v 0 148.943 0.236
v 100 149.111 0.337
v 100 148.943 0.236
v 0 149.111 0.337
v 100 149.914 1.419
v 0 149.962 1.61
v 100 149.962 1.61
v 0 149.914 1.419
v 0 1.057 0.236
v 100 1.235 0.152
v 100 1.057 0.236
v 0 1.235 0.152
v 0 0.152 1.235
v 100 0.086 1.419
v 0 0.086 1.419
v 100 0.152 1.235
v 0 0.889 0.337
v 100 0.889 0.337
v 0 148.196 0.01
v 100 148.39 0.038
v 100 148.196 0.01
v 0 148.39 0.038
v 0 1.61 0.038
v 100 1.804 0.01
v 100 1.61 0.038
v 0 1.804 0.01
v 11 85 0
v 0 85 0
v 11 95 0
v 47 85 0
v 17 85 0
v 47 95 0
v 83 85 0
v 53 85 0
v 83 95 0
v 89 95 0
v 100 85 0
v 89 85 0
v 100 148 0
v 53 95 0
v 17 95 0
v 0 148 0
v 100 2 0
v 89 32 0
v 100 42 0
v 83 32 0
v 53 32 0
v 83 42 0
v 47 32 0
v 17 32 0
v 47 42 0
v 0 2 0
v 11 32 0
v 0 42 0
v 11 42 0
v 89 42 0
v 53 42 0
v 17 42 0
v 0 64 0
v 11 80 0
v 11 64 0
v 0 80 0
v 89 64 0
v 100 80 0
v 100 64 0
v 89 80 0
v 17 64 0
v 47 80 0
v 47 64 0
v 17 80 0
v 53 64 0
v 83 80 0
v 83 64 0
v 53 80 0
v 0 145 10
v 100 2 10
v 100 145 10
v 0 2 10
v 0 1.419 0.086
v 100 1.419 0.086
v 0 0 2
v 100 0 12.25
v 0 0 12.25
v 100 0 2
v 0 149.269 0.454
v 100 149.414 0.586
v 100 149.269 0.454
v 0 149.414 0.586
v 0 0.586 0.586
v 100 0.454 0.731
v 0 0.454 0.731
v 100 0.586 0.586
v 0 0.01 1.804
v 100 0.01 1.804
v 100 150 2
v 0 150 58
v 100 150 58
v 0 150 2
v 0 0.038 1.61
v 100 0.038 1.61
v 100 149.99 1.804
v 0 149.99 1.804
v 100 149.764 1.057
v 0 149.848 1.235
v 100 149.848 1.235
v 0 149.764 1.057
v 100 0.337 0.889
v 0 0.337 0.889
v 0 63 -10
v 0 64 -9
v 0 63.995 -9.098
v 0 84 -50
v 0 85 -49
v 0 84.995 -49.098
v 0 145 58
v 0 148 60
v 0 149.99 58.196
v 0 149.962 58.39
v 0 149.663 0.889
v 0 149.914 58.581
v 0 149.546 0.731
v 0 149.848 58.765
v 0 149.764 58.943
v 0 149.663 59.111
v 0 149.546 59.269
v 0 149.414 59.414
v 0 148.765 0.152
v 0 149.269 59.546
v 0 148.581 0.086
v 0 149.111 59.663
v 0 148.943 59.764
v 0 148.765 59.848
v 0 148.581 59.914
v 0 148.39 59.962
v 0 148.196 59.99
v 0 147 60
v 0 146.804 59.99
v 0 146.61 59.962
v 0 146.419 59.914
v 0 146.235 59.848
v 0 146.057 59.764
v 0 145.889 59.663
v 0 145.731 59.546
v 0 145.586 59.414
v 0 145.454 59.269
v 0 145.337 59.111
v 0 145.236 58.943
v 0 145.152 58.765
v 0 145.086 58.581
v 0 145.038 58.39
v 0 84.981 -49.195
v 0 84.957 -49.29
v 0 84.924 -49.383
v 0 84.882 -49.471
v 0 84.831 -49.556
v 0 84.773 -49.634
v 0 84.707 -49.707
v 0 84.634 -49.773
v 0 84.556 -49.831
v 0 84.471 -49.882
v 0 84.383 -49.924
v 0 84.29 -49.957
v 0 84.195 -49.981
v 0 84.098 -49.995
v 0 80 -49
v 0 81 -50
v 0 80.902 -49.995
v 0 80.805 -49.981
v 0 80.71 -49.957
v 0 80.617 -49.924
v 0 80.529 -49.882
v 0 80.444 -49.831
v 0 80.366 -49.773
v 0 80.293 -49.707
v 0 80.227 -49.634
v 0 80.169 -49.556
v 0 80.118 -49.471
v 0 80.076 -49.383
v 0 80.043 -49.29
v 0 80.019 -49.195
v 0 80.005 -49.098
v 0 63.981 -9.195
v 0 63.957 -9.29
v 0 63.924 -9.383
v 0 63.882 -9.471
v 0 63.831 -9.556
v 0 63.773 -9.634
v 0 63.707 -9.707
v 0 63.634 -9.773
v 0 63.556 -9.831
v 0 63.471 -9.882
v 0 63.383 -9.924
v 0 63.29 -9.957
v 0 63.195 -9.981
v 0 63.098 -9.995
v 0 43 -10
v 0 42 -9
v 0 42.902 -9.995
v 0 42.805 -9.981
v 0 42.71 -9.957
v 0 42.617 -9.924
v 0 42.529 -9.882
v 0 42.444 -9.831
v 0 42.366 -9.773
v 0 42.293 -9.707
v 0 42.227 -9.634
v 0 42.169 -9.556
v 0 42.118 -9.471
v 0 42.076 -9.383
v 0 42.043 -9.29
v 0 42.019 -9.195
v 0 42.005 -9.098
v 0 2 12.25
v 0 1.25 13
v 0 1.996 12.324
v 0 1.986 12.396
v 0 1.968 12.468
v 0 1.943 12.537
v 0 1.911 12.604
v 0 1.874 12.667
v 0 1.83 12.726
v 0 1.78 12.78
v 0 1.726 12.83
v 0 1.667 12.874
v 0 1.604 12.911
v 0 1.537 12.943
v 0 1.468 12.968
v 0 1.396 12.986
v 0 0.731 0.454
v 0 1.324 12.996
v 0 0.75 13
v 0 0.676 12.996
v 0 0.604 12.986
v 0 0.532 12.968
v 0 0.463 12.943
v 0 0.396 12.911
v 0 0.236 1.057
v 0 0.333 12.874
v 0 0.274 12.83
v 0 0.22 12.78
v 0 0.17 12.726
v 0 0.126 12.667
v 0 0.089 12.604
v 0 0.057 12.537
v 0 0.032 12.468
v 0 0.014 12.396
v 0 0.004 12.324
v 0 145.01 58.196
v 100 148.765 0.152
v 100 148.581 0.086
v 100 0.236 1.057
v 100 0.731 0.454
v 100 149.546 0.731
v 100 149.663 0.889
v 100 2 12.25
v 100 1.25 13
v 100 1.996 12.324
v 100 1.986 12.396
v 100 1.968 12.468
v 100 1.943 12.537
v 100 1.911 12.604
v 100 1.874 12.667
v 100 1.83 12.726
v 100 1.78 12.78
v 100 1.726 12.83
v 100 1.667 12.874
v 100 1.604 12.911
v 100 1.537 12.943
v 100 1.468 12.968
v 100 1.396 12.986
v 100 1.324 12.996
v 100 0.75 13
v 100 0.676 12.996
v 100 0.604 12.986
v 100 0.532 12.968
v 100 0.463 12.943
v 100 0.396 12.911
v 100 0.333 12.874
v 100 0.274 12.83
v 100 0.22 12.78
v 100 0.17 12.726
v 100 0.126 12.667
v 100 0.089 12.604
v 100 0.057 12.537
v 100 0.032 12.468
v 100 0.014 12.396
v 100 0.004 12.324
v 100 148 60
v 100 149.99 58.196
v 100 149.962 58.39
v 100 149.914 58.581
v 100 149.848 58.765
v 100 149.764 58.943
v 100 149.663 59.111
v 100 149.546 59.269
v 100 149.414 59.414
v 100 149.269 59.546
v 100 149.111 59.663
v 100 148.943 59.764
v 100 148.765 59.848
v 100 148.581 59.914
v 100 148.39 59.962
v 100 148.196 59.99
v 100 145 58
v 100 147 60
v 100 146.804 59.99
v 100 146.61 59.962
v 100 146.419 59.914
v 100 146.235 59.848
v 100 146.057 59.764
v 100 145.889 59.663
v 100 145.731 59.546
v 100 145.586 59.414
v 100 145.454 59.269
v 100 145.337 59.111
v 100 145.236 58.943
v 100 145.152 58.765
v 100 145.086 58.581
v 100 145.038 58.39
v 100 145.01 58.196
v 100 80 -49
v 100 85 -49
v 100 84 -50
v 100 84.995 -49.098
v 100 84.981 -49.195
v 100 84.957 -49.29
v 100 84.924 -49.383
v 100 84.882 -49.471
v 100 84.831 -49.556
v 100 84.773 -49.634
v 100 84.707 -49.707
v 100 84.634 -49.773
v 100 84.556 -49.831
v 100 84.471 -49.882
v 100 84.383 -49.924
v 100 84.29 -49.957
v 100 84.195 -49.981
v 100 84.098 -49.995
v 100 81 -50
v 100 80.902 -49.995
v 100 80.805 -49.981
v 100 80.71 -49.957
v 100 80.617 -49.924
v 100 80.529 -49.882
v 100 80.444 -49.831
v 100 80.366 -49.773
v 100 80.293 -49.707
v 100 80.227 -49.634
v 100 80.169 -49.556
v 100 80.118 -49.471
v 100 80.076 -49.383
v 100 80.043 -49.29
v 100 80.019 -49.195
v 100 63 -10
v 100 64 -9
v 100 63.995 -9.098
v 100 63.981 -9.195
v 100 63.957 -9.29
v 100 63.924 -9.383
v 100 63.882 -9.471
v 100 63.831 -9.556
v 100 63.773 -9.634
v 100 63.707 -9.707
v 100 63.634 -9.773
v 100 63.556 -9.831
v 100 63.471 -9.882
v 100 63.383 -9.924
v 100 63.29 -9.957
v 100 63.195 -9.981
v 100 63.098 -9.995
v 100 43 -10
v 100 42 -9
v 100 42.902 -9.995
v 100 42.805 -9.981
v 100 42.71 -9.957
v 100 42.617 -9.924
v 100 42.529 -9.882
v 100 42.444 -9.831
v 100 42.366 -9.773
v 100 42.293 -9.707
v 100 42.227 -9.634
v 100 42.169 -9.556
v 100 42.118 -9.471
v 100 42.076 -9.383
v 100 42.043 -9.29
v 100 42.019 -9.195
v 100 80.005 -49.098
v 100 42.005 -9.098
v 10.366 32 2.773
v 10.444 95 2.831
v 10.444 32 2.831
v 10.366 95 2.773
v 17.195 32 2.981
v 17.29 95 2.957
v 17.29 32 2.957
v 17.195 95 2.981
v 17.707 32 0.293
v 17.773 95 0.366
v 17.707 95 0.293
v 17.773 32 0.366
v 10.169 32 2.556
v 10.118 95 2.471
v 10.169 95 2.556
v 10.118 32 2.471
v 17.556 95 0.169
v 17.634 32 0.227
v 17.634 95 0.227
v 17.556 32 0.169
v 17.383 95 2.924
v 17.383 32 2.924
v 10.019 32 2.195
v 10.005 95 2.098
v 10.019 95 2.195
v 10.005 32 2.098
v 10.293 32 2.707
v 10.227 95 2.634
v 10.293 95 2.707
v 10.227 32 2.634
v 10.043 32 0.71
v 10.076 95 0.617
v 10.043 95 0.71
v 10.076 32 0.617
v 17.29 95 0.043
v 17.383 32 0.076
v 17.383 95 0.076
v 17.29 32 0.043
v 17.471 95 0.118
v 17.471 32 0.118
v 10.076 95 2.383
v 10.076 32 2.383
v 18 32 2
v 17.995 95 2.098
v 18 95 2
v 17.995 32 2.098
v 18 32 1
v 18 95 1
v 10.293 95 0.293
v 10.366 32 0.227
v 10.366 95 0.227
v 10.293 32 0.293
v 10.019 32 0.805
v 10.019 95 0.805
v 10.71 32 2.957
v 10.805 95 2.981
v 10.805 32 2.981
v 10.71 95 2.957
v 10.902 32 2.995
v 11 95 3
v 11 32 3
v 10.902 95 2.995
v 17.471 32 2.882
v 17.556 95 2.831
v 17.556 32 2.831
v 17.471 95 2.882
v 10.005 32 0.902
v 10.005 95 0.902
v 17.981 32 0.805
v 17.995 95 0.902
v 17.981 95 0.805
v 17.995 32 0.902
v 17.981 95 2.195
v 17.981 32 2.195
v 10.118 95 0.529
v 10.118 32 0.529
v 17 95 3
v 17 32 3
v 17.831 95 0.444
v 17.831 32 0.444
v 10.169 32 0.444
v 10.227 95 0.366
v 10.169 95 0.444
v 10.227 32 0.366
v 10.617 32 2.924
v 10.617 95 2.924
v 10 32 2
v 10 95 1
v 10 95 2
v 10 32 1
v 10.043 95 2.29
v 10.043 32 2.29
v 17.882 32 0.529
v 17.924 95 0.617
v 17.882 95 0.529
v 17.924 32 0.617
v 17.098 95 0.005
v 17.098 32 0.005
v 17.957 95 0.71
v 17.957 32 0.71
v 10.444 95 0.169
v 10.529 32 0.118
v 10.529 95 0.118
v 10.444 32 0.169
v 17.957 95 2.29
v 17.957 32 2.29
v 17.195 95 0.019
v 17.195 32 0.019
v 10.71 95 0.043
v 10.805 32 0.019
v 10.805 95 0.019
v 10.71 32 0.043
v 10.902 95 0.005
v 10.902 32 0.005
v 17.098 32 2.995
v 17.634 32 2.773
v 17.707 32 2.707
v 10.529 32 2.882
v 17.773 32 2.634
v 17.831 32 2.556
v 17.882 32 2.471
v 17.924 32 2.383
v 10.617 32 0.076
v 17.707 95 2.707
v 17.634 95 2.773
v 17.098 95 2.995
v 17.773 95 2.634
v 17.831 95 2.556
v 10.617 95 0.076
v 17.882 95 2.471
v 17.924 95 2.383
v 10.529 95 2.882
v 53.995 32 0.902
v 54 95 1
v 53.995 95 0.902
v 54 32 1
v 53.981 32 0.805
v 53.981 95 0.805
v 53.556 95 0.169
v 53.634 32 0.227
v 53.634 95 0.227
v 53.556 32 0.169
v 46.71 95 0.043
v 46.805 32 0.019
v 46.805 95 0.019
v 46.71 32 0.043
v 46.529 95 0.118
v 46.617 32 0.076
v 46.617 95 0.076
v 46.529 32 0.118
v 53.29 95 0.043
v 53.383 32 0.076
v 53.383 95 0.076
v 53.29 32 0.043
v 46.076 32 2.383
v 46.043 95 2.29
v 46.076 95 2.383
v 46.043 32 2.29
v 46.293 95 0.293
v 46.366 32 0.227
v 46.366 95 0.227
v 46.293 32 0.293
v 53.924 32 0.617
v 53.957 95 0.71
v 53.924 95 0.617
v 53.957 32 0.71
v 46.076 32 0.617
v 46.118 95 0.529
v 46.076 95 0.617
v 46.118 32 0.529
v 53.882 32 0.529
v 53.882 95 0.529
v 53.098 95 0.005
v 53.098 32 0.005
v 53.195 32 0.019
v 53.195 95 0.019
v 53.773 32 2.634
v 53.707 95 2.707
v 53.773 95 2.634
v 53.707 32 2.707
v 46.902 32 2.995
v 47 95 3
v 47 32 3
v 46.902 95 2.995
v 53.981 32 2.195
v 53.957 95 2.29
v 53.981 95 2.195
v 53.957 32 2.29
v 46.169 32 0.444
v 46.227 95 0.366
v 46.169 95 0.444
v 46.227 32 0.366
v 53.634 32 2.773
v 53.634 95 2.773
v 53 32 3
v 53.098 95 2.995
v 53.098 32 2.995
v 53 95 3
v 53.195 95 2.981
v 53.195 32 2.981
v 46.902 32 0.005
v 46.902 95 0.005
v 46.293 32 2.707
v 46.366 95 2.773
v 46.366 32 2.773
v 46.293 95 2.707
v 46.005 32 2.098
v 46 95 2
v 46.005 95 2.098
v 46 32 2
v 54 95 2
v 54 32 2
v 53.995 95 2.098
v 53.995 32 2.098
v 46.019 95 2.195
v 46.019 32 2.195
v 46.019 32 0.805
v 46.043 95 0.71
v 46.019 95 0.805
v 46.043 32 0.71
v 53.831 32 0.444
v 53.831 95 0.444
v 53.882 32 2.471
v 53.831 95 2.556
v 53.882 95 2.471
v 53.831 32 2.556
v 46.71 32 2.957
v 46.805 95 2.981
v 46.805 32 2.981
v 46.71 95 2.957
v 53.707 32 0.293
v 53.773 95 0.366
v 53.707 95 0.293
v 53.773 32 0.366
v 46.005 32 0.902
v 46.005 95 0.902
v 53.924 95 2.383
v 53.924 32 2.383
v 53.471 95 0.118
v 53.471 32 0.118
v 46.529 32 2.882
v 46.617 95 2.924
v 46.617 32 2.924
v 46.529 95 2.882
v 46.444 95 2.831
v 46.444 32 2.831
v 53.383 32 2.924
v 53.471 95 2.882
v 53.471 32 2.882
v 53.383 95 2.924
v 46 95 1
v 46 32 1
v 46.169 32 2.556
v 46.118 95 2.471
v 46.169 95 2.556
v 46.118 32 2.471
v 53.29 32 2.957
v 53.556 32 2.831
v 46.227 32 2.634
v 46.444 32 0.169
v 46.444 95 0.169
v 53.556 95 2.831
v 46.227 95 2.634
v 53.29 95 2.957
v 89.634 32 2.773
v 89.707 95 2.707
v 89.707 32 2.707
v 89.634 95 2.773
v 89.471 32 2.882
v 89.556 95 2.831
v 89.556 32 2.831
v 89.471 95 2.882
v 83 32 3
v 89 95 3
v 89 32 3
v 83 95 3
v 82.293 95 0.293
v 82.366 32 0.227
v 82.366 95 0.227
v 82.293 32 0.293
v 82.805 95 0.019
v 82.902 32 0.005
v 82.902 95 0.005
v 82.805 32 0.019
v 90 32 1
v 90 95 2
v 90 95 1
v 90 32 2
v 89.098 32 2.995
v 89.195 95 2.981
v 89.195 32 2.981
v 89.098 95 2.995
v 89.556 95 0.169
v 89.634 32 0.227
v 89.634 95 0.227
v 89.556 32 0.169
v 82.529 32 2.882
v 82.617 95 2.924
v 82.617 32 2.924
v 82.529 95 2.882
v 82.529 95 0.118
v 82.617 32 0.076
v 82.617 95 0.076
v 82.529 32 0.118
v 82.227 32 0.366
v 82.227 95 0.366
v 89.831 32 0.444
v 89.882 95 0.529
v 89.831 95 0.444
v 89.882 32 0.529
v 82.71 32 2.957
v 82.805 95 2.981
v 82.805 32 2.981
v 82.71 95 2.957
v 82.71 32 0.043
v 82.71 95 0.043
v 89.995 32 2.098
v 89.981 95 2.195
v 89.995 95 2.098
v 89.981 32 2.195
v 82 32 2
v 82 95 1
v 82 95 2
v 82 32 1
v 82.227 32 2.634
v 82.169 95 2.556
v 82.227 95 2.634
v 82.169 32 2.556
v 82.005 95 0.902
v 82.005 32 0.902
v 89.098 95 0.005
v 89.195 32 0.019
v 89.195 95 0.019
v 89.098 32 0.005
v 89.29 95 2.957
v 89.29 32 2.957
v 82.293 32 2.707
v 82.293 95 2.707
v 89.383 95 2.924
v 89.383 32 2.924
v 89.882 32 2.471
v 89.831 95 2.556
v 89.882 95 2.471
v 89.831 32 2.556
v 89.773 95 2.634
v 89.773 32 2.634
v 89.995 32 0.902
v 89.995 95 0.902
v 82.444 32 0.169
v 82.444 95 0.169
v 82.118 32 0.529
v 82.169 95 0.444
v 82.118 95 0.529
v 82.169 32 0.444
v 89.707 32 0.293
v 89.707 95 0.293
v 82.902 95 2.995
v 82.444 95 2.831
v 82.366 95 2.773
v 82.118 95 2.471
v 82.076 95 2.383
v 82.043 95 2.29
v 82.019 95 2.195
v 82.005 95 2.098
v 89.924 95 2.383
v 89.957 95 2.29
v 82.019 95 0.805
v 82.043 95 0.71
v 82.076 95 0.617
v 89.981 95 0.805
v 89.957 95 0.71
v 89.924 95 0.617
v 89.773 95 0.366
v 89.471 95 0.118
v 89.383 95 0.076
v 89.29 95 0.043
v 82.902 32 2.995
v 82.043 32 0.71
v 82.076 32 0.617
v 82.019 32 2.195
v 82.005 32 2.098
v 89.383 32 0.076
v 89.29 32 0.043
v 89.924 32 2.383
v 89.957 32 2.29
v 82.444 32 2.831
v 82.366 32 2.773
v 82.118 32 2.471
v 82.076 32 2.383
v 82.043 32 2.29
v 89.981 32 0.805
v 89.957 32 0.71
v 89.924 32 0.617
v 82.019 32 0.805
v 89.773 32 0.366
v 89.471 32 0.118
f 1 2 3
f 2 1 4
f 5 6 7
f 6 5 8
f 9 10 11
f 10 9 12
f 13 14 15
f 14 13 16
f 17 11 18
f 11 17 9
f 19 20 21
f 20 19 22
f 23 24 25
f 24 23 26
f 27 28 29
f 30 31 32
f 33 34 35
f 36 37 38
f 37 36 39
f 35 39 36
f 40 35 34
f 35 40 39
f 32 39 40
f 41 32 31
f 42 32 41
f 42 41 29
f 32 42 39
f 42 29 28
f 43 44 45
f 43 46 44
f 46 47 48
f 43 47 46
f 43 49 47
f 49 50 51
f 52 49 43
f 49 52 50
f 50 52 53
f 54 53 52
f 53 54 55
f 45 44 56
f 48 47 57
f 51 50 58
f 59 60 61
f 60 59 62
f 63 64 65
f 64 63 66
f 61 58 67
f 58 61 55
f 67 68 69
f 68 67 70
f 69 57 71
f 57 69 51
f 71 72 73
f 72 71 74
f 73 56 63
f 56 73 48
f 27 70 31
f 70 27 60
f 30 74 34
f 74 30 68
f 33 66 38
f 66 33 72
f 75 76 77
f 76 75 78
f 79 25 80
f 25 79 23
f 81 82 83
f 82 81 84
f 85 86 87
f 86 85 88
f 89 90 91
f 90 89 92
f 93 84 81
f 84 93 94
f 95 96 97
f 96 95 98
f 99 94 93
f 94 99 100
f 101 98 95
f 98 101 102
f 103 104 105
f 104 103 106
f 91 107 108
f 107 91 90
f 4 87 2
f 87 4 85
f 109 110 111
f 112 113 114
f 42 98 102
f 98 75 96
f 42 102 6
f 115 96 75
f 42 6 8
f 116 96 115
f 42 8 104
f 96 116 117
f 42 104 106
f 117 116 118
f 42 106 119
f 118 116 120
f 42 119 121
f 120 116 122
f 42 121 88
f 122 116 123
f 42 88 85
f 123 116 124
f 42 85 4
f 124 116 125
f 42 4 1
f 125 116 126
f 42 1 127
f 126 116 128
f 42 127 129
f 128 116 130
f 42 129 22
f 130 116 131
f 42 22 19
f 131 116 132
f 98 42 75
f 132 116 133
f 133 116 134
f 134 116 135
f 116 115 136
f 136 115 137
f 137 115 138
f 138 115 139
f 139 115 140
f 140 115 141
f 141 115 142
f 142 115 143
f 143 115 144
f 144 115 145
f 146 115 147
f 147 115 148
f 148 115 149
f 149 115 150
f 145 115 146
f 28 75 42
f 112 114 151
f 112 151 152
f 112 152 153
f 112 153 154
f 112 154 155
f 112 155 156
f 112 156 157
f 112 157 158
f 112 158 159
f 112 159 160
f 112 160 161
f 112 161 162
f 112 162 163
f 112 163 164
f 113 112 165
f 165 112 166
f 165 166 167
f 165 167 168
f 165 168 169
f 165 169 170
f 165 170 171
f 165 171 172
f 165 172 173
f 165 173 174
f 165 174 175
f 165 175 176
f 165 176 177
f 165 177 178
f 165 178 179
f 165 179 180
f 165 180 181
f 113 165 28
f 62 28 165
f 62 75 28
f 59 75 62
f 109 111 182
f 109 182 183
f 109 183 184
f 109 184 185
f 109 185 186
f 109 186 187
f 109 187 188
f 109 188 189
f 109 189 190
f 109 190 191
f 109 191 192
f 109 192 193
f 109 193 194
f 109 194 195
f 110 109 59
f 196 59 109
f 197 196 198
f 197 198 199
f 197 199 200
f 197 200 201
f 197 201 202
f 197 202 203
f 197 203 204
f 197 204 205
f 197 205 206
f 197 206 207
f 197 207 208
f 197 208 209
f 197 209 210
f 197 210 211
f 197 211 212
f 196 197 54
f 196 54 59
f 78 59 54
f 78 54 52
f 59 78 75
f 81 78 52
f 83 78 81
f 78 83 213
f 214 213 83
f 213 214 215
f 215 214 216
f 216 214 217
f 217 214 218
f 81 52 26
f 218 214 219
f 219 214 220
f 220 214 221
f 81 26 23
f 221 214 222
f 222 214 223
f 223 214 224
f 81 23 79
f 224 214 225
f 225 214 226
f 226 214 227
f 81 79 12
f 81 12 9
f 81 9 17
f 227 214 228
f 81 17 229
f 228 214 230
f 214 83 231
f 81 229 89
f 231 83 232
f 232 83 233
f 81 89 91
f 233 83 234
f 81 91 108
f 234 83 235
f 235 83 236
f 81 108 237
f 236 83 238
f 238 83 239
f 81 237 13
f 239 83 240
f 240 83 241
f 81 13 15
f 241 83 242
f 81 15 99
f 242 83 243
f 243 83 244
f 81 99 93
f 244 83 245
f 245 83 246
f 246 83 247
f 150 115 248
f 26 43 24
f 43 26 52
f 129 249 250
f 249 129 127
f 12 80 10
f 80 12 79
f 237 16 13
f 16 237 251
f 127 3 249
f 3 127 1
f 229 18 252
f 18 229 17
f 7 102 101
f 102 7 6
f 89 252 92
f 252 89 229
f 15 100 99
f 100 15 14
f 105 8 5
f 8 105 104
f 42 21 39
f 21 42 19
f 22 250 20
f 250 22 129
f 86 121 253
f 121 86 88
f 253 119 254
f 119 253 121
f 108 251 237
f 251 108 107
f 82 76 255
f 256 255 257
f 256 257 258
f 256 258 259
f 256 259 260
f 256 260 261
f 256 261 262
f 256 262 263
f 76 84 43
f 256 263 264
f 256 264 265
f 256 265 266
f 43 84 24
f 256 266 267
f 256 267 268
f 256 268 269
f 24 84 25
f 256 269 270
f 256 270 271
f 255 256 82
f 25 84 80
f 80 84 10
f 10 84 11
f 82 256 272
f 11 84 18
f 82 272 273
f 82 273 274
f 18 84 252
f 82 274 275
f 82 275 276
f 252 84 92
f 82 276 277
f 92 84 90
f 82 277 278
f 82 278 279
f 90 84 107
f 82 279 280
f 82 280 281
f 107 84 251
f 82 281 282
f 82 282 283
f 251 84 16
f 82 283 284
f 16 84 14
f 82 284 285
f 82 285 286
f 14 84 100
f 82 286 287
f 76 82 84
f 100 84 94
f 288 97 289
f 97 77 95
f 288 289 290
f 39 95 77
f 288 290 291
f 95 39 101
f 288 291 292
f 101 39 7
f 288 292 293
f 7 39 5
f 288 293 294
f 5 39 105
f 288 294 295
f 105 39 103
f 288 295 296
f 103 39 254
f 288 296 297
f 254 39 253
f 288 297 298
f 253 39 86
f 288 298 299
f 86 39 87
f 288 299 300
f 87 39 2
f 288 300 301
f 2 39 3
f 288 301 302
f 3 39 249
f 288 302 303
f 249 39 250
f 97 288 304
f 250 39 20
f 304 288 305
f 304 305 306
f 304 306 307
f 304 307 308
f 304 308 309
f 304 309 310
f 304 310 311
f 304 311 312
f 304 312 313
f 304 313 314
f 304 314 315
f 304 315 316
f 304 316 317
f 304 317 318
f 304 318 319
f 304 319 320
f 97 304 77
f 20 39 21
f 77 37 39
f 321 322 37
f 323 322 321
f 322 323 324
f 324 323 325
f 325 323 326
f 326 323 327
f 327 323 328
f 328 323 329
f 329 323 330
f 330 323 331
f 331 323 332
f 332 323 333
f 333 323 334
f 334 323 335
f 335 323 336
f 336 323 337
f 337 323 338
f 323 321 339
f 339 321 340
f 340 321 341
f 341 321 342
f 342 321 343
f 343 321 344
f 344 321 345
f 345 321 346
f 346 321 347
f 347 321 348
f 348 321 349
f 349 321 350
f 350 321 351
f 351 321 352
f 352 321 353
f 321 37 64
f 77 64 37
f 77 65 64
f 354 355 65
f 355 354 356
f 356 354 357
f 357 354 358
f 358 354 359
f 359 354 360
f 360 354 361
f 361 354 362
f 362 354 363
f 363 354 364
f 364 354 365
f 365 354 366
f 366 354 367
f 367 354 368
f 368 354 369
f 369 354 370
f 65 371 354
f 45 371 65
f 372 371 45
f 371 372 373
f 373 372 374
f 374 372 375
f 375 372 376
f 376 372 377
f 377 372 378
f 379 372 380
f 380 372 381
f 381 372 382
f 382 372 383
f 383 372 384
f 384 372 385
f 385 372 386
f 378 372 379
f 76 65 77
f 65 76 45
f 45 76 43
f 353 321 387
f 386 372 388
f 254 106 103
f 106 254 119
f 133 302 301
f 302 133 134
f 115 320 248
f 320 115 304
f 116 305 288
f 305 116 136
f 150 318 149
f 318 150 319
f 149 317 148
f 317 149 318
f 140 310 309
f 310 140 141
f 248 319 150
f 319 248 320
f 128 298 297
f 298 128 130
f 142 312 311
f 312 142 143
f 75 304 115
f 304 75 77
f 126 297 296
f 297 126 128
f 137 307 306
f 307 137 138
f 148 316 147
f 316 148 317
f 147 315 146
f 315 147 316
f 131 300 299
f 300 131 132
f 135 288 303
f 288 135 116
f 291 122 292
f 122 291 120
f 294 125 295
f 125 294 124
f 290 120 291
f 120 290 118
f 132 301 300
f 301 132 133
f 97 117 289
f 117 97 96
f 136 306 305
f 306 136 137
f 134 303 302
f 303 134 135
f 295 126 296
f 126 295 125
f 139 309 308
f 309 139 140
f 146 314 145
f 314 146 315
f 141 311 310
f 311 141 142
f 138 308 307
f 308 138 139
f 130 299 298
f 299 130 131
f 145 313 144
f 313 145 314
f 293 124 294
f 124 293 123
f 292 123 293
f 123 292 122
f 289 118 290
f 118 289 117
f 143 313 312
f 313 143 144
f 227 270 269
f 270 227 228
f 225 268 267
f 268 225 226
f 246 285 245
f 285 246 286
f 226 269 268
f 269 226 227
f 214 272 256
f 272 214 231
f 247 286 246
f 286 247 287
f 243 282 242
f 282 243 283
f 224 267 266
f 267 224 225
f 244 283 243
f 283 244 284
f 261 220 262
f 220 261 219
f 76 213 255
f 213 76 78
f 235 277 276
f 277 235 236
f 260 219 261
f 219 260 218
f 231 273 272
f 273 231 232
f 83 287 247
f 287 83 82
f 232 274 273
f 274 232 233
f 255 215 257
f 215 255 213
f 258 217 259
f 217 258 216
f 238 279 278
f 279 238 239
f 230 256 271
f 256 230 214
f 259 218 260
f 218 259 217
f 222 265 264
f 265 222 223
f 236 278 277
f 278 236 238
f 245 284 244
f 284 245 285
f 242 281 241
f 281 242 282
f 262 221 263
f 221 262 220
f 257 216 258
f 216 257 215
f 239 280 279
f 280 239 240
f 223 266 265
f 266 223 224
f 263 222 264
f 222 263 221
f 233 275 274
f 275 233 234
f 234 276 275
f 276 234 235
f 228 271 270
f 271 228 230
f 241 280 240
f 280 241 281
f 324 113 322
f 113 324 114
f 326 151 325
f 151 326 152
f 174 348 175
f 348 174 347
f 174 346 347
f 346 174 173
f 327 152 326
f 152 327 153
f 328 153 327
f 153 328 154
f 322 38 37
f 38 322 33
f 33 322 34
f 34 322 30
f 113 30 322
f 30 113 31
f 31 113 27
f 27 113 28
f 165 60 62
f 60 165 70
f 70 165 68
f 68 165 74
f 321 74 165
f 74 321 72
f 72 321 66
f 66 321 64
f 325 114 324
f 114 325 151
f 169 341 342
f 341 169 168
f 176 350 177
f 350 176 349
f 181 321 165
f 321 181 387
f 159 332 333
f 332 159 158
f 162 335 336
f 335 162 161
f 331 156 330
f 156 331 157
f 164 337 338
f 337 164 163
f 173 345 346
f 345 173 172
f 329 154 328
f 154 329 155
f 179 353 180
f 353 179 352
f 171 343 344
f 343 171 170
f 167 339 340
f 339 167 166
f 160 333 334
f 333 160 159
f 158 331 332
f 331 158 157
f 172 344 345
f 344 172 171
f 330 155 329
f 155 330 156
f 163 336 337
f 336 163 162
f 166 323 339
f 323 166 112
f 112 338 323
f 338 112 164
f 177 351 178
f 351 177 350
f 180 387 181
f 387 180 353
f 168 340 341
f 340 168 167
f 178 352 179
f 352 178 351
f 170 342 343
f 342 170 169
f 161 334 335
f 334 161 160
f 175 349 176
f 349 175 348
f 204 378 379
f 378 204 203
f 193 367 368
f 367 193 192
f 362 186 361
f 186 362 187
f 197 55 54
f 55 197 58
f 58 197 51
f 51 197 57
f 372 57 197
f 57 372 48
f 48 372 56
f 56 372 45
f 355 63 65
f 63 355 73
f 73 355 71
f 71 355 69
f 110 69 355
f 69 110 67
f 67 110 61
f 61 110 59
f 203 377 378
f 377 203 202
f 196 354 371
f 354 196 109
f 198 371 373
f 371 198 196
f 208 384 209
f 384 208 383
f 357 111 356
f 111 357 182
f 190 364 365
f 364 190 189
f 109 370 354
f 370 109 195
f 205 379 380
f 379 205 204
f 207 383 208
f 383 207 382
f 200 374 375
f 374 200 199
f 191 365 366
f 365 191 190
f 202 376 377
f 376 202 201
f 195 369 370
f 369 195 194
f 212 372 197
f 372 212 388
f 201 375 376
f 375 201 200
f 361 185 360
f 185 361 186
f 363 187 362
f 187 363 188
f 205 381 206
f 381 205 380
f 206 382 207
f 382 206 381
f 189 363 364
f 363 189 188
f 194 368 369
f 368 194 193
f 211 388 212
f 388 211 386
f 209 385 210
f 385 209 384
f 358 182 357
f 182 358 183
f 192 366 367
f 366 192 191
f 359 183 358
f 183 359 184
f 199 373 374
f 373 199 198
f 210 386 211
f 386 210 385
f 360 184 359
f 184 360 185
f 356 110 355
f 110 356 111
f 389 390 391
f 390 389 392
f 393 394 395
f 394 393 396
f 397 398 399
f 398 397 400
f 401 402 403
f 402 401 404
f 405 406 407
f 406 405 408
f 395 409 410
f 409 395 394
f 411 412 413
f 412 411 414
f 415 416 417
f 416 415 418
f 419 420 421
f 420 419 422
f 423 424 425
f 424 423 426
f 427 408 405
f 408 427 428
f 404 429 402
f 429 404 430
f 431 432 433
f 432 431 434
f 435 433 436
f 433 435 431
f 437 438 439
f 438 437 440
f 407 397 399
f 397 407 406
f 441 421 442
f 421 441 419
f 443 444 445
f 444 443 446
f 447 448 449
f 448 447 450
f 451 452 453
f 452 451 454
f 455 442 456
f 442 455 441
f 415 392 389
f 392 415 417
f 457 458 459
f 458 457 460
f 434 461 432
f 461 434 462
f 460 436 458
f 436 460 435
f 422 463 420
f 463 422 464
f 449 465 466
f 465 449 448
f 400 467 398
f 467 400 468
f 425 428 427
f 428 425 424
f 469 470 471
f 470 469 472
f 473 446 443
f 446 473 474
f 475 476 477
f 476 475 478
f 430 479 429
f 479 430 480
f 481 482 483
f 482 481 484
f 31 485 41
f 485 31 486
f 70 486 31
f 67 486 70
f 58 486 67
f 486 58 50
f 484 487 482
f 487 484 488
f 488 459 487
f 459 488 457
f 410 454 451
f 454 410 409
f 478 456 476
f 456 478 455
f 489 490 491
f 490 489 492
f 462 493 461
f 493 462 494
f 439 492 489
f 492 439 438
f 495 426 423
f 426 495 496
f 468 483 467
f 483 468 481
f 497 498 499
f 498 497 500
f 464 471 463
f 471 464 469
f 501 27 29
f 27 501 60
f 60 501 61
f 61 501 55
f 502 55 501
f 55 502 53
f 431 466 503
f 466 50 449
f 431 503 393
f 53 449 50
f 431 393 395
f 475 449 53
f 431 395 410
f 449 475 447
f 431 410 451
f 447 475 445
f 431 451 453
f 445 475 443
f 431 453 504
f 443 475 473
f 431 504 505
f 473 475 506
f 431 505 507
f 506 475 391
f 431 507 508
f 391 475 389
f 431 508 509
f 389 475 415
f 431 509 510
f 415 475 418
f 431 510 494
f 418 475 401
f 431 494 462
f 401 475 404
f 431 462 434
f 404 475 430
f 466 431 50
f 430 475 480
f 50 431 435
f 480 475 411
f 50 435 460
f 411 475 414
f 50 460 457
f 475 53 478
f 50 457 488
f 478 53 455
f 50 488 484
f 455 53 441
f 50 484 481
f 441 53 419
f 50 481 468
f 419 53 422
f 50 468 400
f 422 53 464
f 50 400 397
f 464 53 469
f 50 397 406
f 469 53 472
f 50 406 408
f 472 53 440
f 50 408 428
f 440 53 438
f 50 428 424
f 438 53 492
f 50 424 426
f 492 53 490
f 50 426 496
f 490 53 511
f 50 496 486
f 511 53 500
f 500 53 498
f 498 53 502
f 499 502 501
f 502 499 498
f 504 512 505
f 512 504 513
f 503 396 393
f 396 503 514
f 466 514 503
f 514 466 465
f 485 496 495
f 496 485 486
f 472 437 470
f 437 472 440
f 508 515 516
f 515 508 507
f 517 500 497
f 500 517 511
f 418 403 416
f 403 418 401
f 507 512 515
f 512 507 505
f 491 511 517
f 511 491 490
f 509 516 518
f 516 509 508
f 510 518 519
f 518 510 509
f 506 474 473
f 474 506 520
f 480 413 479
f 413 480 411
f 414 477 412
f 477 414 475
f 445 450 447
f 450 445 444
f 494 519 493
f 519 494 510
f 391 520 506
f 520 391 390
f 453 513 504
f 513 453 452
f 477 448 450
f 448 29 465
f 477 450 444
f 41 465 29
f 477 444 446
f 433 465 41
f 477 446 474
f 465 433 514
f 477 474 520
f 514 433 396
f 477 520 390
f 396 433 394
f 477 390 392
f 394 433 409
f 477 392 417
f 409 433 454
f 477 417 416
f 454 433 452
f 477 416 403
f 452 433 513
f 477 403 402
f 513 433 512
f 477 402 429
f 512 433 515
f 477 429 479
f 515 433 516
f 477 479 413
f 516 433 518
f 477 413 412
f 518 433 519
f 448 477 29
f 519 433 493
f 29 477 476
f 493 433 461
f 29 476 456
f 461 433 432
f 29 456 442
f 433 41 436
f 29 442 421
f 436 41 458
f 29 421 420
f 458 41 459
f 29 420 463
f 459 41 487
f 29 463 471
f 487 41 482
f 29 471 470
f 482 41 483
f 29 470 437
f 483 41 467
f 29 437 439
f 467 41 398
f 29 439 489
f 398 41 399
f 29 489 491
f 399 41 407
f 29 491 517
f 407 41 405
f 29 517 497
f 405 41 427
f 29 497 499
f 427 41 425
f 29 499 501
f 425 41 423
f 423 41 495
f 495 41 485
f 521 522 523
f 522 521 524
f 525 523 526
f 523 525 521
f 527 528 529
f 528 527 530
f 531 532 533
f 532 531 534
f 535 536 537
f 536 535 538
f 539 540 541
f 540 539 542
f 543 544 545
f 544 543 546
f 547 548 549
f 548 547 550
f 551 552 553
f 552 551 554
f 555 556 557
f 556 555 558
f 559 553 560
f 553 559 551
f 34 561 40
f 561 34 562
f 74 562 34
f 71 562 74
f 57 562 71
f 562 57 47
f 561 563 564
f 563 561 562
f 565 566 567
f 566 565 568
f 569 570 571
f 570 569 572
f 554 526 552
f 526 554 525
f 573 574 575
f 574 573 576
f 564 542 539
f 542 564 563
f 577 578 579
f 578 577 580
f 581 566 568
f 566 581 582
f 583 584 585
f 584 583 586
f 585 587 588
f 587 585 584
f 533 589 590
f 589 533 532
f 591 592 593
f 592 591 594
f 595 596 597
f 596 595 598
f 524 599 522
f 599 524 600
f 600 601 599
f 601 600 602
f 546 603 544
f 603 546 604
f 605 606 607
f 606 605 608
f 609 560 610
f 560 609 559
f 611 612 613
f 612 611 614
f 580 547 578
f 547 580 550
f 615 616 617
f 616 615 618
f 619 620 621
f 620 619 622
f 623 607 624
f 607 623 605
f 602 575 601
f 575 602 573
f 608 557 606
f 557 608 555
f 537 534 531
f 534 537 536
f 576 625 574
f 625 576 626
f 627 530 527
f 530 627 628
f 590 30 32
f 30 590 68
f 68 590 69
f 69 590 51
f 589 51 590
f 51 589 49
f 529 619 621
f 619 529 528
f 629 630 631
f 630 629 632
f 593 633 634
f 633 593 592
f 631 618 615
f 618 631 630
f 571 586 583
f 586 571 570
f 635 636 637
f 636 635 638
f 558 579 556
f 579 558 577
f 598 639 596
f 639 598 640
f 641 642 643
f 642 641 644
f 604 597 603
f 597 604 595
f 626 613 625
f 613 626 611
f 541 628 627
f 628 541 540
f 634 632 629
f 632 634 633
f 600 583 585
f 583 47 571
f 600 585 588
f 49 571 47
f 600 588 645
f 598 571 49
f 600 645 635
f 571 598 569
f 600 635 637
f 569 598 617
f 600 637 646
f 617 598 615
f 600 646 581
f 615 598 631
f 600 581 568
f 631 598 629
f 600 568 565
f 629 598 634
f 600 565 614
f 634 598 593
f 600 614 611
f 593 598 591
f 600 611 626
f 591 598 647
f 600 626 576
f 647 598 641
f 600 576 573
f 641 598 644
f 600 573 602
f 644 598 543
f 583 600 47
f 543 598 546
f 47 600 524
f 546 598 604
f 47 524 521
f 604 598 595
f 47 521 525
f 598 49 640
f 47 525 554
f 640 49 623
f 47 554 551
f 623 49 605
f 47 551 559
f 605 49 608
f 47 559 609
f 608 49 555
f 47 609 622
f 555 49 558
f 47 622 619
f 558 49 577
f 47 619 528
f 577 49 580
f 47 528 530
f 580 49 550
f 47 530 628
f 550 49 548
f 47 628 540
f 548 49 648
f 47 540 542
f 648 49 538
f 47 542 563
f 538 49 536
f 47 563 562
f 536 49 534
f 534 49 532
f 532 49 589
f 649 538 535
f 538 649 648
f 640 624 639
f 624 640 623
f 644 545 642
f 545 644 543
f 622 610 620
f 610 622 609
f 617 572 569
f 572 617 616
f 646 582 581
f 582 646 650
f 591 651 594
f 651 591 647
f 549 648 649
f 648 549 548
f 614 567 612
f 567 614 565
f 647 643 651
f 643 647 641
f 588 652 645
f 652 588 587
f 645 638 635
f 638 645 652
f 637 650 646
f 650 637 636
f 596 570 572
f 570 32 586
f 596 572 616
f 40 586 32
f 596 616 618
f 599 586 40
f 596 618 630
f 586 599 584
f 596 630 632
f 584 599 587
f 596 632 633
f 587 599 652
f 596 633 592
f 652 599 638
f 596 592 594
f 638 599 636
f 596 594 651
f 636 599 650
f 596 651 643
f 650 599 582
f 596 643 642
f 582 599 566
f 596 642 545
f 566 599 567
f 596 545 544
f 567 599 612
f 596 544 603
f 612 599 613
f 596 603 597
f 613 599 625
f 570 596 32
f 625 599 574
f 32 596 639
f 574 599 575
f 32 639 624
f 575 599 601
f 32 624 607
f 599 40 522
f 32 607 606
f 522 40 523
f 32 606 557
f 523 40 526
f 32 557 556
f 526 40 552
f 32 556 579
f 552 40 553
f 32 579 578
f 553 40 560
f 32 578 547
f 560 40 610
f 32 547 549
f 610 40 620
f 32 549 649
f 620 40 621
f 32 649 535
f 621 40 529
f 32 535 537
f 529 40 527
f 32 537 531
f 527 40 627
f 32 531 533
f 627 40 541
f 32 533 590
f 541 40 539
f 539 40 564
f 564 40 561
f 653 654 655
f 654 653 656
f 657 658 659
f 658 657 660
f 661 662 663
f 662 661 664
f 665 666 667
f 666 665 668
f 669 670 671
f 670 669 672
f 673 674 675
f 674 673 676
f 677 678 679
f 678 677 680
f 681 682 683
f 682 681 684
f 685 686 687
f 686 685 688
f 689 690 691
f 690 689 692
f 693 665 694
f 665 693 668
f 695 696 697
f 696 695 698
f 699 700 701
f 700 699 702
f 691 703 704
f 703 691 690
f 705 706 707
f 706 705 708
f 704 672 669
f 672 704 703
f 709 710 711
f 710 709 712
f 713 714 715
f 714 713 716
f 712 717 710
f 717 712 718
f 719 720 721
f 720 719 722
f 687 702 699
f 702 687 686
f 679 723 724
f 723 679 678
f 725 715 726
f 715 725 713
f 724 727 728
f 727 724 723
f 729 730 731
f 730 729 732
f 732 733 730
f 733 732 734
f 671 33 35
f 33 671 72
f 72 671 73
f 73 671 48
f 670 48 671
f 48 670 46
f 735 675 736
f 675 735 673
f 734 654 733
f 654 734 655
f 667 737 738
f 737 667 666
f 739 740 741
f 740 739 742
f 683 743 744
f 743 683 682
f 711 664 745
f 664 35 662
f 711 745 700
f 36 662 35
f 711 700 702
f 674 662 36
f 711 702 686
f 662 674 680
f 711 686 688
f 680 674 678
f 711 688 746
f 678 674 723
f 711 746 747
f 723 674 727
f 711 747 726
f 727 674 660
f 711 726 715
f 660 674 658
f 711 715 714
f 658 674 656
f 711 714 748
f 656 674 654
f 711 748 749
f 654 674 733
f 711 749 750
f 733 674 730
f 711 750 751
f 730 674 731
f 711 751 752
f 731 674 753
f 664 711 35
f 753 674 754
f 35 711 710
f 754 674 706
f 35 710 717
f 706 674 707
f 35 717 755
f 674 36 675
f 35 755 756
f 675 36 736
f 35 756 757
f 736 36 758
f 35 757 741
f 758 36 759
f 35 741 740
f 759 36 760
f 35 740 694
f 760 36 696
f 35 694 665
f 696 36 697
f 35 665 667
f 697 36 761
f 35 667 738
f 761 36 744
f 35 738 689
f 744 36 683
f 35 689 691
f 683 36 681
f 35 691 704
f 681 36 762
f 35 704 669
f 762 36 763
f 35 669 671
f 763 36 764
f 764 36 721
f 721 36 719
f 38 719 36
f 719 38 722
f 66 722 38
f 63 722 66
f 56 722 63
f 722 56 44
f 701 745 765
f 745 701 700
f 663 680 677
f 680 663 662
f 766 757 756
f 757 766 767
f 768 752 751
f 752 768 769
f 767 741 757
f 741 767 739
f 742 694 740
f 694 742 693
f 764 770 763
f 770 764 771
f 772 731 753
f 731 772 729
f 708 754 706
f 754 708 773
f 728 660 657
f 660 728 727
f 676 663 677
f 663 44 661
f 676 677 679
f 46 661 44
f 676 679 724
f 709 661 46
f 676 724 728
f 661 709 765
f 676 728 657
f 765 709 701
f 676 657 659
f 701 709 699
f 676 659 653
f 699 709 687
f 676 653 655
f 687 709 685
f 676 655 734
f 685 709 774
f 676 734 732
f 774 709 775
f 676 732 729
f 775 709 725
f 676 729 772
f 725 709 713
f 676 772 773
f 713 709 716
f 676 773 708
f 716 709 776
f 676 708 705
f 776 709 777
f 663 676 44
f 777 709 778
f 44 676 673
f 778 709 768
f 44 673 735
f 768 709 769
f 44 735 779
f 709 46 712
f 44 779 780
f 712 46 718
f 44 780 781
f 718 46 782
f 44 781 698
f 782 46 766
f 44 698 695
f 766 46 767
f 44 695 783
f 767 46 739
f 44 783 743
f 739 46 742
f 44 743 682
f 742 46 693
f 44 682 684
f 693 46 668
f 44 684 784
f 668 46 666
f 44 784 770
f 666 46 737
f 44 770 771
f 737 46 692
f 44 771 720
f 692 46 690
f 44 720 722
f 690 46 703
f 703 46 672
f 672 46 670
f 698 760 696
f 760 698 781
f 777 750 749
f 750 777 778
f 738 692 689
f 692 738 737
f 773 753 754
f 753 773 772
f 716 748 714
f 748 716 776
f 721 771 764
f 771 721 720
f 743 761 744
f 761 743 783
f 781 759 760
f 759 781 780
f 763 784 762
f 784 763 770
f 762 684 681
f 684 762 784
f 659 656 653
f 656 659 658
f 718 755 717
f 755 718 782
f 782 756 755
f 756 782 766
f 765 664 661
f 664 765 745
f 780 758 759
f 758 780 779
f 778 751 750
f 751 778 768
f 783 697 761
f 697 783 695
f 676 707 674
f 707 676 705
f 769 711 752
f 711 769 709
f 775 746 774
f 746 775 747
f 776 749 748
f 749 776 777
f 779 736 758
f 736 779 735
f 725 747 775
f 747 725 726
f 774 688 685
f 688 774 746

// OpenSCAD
// 100mm-wide bar shelf — see bar_shelf.scad for the design.
shelf_width_override = 100;
include <bar_shelf.scad>
